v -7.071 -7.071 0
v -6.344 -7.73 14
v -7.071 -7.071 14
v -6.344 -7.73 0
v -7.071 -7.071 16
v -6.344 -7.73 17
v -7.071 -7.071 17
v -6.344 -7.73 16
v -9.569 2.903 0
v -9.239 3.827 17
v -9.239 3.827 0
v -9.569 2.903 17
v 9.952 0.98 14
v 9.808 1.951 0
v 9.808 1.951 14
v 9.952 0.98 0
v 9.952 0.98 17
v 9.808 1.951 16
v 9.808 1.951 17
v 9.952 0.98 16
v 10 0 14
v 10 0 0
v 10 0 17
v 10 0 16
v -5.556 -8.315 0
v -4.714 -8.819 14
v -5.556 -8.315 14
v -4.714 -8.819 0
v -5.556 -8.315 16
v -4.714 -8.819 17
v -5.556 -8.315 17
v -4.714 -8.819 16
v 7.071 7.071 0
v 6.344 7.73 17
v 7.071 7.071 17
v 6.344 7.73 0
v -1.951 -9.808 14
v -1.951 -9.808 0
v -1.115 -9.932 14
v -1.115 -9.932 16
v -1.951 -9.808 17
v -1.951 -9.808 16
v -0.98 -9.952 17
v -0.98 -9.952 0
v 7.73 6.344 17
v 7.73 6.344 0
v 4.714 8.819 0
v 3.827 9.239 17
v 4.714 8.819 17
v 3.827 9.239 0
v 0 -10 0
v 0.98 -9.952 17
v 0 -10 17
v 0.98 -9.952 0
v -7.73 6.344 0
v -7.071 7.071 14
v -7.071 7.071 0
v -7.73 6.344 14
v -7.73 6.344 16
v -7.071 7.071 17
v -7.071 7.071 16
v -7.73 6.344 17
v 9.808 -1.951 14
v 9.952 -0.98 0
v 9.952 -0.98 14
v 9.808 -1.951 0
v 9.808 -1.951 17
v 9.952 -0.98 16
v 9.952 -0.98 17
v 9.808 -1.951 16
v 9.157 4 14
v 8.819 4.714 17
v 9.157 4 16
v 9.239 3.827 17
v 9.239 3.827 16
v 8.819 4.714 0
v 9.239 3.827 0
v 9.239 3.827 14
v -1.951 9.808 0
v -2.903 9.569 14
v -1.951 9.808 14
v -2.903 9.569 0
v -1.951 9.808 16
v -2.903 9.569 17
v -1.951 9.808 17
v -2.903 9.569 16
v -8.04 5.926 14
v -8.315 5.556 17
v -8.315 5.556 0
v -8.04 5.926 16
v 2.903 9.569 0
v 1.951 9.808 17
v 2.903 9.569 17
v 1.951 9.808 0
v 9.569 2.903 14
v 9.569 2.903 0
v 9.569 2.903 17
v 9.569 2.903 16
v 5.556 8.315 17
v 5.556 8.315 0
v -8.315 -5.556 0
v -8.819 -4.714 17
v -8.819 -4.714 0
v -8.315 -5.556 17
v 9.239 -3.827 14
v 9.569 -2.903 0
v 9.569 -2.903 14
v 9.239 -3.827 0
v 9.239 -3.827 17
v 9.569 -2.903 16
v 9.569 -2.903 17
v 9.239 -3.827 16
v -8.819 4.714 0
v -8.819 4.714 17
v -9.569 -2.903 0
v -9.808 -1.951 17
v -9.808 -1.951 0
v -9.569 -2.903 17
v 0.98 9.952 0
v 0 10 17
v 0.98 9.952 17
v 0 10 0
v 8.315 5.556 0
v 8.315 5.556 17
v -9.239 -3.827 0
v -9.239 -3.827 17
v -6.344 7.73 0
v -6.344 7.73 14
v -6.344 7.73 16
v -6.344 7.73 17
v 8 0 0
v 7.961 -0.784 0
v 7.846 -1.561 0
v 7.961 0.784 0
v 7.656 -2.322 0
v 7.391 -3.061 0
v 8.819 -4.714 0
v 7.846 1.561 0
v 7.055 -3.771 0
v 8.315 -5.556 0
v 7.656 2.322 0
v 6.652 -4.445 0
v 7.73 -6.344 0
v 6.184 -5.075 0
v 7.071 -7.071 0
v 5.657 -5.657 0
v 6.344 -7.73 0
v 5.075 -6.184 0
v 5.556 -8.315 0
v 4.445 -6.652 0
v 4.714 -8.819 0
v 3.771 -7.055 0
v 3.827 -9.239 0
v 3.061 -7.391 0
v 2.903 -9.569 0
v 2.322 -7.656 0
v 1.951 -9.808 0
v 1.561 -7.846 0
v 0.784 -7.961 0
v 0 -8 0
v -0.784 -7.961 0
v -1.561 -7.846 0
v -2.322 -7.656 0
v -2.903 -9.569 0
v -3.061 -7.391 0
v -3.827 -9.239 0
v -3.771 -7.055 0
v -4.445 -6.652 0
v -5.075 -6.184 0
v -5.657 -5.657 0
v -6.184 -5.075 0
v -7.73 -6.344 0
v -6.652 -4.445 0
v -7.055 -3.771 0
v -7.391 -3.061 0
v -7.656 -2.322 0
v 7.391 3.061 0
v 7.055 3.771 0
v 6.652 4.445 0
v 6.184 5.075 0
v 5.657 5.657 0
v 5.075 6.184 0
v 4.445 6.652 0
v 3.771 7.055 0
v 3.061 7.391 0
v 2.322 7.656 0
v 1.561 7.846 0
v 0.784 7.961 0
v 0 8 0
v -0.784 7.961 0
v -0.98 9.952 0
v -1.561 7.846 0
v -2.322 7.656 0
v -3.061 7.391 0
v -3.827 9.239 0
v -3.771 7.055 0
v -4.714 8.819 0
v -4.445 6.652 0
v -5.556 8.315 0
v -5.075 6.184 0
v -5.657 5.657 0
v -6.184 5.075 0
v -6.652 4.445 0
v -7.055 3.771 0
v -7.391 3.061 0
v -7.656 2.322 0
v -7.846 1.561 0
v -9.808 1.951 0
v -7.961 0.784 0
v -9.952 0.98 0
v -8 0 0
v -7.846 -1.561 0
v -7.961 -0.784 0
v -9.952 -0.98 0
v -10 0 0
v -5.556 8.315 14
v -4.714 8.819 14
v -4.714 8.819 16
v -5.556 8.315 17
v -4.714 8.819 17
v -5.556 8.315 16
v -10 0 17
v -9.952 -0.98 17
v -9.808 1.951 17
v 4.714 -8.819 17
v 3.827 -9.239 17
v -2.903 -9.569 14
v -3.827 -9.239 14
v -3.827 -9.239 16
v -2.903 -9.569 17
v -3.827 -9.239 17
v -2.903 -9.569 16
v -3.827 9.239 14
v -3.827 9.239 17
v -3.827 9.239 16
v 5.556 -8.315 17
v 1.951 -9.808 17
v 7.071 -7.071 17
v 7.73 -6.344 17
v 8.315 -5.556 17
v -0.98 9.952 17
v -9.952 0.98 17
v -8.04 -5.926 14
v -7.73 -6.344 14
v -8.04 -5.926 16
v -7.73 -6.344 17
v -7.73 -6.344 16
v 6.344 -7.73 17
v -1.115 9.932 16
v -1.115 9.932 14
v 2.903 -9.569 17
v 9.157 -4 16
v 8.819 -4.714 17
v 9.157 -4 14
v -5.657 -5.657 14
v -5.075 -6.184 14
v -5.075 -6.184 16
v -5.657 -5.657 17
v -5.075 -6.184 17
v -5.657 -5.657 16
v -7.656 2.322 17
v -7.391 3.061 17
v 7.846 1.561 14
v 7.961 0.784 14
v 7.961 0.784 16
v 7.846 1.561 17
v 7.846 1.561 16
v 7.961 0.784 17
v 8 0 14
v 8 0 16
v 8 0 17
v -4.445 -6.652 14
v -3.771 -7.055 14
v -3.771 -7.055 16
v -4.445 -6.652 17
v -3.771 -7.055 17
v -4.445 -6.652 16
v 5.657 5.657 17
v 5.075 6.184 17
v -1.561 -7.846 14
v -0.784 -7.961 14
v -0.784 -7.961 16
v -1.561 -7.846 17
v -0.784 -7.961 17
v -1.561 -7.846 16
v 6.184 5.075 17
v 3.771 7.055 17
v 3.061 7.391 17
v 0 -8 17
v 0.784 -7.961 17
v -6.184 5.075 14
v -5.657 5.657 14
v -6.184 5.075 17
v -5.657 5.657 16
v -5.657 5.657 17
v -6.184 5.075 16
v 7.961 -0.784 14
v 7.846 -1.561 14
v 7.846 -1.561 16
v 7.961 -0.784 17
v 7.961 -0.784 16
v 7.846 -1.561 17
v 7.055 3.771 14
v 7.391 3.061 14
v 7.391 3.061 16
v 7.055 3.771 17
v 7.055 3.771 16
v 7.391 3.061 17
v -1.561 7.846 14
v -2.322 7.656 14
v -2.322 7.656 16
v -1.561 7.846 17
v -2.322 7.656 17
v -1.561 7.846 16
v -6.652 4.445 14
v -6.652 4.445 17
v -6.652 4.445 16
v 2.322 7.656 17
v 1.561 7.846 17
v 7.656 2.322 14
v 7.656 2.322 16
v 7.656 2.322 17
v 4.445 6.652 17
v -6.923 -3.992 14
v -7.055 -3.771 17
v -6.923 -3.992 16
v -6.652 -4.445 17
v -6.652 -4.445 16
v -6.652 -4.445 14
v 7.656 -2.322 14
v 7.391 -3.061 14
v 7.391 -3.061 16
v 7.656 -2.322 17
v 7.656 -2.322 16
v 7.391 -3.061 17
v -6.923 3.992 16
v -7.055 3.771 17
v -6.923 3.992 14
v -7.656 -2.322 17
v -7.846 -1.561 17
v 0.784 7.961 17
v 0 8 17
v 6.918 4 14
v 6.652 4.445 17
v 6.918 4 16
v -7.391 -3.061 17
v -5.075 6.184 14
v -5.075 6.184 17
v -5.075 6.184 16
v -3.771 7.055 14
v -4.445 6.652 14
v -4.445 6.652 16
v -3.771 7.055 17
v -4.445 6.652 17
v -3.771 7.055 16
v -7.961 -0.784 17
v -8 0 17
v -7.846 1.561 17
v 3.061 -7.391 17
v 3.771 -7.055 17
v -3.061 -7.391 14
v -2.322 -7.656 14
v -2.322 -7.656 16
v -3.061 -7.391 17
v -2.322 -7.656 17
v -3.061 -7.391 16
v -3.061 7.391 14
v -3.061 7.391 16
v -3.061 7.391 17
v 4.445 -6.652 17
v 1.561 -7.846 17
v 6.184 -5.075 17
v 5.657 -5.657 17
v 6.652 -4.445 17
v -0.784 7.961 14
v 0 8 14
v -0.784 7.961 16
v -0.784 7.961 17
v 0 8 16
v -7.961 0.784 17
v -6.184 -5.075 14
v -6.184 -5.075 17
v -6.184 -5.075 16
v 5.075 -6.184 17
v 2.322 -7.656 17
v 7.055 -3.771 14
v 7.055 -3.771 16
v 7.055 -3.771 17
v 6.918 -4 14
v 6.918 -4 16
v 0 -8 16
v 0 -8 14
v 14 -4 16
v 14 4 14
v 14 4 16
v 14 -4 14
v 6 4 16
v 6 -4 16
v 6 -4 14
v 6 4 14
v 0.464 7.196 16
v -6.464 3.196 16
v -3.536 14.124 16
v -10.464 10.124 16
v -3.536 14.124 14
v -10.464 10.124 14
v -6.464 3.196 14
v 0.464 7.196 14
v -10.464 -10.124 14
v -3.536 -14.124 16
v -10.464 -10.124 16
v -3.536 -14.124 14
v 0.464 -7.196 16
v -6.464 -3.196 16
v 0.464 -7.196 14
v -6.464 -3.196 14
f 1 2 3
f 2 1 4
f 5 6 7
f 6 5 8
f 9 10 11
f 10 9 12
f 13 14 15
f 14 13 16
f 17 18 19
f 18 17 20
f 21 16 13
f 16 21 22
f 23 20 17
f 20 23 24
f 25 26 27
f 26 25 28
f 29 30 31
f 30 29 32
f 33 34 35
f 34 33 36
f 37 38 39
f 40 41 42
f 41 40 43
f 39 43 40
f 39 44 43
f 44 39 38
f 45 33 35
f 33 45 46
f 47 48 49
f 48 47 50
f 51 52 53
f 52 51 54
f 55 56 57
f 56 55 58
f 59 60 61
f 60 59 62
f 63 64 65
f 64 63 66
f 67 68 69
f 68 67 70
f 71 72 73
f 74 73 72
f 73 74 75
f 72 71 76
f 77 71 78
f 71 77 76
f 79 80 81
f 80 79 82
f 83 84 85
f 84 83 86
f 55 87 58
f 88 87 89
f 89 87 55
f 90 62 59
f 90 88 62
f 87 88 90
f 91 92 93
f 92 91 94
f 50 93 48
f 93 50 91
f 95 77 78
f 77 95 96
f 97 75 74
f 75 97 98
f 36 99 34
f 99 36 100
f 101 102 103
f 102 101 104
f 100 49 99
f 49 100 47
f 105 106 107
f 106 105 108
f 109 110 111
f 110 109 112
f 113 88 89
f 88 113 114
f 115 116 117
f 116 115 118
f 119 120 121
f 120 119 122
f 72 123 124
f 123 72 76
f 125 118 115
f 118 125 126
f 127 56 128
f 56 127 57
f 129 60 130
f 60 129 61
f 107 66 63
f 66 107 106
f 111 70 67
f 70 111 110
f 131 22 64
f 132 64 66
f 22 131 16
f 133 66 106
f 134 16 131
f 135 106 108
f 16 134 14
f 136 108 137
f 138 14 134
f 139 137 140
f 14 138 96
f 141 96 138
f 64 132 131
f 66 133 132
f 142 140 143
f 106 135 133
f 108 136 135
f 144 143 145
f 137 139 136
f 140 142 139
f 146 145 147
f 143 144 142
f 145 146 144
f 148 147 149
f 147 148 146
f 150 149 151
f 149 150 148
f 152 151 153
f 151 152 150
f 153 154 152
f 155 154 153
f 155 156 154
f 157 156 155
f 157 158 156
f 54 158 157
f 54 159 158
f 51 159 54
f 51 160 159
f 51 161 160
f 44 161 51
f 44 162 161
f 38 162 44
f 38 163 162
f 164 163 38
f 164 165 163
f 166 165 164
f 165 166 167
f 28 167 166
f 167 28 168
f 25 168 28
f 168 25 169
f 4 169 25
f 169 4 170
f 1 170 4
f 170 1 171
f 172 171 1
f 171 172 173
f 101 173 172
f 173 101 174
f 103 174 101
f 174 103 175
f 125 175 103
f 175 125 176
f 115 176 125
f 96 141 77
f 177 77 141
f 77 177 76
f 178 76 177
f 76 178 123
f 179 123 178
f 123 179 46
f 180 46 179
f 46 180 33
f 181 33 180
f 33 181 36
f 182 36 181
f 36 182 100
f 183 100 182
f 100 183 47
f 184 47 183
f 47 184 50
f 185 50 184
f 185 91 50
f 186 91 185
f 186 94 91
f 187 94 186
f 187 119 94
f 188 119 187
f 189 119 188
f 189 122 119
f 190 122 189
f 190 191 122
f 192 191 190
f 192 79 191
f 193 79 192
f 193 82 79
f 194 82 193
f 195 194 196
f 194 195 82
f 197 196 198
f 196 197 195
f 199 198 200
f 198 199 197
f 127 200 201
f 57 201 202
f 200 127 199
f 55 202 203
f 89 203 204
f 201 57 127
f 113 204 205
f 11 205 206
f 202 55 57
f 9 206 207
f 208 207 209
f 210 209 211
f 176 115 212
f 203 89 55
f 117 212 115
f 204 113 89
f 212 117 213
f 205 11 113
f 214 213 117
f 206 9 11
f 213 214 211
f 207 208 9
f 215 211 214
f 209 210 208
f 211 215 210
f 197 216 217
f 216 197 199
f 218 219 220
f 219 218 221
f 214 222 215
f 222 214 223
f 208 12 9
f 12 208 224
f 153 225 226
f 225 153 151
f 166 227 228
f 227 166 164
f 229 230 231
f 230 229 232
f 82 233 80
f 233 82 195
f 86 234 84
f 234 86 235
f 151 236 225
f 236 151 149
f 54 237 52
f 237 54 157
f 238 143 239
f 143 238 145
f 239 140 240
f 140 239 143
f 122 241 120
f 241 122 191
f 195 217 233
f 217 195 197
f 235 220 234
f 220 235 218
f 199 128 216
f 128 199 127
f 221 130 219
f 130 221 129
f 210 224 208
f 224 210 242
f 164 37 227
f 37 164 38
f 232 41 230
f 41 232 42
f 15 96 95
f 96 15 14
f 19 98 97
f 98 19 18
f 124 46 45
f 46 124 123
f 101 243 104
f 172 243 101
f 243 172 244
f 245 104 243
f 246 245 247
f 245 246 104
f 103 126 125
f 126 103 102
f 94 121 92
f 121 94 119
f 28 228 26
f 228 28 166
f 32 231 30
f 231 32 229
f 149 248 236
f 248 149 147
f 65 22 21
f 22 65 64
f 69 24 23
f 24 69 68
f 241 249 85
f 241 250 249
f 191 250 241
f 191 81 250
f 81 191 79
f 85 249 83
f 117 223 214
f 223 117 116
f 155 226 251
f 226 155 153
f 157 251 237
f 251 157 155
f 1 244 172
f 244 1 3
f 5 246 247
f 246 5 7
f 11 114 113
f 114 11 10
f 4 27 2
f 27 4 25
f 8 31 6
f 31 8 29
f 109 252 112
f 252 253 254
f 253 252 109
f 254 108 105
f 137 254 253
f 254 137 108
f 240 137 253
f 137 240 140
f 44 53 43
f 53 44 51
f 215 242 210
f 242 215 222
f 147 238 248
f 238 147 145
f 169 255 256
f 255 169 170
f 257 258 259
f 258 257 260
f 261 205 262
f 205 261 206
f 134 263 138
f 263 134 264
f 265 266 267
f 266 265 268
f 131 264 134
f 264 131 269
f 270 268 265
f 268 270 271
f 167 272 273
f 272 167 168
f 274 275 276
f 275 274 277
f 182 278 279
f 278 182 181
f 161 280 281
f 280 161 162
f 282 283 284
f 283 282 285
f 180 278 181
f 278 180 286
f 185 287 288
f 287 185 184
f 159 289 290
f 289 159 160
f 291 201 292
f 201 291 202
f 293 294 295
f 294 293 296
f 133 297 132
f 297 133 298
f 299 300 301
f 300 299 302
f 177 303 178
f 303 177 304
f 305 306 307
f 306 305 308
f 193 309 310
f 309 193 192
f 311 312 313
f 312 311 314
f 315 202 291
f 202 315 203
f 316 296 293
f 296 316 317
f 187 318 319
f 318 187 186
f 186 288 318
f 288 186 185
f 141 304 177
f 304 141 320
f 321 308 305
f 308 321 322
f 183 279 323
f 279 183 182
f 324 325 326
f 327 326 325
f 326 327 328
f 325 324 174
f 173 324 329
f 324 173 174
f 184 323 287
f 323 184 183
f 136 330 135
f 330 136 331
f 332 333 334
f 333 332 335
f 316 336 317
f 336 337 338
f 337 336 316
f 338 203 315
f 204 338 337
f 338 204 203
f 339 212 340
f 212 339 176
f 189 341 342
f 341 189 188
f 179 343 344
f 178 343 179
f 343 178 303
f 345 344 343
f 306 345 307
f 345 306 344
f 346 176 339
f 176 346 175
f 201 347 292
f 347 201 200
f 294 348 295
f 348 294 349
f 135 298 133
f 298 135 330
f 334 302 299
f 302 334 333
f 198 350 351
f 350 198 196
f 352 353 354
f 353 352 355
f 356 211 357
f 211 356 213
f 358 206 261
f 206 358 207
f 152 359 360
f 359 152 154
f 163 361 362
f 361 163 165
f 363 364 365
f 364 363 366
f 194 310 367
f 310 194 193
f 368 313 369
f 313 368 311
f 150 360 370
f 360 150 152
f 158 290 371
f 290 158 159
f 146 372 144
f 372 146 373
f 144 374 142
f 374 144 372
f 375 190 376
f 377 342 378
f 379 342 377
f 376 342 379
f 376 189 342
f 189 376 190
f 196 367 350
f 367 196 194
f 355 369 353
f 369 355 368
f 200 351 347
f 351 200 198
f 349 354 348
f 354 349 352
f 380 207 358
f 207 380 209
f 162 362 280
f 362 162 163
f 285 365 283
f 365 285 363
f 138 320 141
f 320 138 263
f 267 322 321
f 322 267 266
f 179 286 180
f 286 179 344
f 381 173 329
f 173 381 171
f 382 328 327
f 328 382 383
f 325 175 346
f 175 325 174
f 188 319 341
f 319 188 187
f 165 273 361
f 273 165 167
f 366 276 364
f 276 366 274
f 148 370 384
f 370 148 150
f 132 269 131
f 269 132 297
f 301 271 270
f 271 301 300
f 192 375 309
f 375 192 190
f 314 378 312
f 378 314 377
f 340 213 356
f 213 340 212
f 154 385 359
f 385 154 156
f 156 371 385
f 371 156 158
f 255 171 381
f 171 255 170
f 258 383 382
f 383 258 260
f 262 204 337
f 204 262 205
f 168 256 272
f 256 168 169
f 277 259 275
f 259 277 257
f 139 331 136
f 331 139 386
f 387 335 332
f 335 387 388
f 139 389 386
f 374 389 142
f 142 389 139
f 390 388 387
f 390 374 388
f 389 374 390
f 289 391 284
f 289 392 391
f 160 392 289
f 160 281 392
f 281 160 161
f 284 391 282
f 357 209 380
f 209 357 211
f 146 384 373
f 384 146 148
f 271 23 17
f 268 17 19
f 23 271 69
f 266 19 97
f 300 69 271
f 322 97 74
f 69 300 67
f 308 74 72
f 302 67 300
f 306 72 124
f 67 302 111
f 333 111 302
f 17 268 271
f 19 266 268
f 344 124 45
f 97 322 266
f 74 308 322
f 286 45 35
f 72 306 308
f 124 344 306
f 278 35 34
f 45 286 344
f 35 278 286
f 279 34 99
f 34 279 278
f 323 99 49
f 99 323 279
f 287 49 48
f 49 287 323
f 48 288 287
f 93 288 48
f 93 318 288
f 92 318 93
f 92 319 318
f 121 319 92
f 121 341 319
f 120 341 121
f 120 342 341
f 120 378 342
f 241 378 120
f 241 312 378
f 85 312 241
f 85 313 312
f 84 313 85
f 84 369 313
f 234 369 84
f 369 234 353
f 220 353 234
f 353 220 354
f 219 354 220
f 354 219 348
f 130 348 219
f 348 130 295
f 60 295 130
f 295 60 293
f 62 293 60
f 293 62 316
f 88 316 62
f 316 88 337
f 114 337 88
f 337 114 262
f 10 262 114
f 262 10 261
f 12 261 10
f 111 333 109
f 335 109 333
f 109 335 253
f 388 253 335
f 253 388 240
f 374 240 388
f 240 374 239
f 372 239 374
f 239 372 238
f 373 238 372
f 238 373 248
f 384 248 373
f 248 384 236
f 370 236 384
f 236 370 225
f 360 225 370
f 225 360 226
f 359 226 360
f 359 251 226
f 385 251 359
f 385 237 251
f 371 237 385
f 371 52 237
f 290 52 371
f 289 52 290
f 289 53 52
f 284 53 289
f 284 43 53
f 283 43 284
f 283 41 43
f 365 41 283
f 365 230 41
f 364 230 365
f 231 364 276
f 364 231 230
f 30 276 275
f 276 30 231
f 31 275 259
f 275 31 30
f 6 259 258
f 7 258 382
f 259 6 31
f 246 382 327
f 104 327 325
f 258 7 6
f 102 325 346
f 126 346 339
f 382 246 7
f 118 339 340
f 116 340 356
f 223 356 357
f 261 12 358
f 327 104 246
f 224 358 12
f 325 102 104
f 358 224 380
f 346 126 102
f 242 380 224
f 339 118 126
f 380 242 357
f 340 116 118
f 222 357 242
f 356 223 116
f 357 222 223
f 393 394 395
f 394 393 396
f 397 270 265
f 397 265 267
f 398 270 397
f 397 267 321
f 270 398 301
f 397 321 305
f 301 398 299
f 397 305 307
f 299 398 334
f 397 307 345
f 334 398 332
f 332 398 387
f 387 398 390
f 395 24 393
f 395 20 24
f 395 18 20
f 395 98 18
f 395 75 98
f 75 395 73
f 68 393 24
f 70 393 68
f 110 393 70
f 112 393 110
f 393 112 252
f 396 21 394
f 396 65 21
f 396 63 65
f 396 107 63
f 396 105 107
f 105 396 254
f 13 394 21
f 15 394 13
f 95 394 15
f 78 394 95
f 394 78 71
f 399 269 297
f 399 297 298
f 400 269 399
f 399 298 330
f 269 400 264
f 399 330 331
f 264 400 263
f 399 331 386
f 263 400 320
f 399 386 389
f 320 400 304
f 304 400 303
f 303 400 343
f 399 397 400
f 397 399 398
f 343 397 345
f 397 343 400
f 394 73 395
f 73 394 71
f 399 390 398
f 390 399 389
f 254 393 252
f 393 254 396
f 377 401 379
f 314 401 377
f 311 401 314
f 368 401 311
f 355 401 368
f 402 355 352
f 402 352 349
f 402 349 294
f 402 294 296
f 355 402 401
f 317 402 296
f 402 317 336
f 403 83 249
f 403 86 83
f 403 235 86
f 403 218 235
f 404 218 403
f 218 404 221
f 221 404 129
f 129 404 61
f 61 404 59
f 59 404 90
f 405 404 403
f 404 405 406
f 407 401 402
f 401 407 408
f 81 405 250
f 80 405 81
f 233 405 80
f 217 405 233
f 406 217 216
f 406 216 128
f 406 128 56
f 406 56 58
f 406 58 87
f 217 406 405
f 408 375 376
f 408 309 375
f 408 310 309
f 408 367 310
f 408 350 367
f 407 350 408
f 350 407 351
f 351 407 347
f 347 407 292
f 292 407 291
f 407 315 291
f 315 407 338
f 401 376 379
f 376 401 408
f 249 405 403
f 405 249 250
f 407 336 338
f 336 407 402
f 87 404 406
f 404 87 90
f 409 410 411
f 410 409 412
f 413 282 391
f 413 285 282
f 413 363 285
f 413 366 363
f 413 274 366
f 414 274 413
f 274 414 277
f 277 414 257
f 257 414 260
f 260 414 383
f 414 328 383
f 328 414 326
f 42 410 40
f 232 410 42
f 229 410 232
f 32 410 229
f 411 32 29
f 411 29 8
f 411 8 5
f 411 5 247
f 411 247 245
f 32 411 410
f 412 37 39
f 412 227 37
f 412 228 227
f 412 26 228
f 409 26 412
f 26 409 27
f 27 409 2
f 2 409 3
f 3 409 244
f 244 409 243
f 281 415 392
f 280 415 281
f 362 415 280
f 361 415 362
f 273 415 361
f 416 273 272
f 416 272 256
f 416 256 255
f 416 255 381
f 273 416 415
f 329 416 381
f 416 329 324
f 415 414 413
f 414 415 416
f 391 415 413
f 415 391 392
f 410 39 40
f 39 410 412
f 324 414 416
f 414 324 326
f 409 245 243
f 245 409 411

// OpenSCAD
// ============================================================================
// Switch Holder
// Purpose: Panel-mount switch housing for electronic projects
// Units: millimetres (mm)
// ============================================================================

/* ----------------------------- USER PARAMETERS -------------------------------- */
switch_diameter = 16;       // switch shaft diameter (mm)
panel_thickness = 3;        // panel thickness to mount in (mm)
holder_height = 20;         // total holder height (mm)
wall_thickness = 2;         // wall thickness (mm)
mounting_tabs = true;       // include mounting tabs
tab_width = 8;              // mounting tab width (mm)
tab_thickness = 2;          // mounting tab thickness (mm)

/* ------------------------- Assertions & Limits ---------------------------- */
assert(switch_diameter > 0, "Switch diameter must be > 0");
assert(panel_thickness > 0, "Panel thickness must be > 0");
assert(wall_thickness >= 1, "Wall thickness should be ≥ 1mm");

/* ------------------------- Derived Measurements --------------------------- */
outer_diameter = switch_diameter + 2*wall_thickness;
total_height = holder_height;

/* ------------------------------ Modules ---------------------------------- */
module switch_holder() {
    difference() {
        // Main body
        cylinder(d=outer_diameter, h=total_height, $fn=64);
        
        // Switch hole
        translate([0, 0, -0.5]) {
            cylinder(d=switch_diameter, h=total_height + 1, $fn=64);
        }
        
        // Panel cutout
        translate([0, 0, total_height - panel_thickness]) {
            cylinder(d=outer_diameter + 2, h=panel_thickness + 1, $fn=64);
        }
    }
    
    // Mounting tabs
    if (mounting_tabs) {
        for (angle = [0, 120, 240]) {
            rotate([0, 0, angle]) {
                translate([outer_diameter/2, 0, total_height - panel_thickness - tab_thickness]) {
                    cube([tab_width, tab_width, tab_thickness], center=true);
                }
            }
        }
    }
}

/* --------------------------------- Call ---------------------------------- */
switch_holder();

/* ============================== HOW TO PRINT / ORIENT ============================== */
// Print orientation: Base down on build plate
// Supports: None needed for this design
// Layer height: 0.2mm for smooth fit
// Infill: 25-30% for mounting strength
// Print speed: Normal (50mm/s)
// Post-processing: Test fit switch before final assembly
